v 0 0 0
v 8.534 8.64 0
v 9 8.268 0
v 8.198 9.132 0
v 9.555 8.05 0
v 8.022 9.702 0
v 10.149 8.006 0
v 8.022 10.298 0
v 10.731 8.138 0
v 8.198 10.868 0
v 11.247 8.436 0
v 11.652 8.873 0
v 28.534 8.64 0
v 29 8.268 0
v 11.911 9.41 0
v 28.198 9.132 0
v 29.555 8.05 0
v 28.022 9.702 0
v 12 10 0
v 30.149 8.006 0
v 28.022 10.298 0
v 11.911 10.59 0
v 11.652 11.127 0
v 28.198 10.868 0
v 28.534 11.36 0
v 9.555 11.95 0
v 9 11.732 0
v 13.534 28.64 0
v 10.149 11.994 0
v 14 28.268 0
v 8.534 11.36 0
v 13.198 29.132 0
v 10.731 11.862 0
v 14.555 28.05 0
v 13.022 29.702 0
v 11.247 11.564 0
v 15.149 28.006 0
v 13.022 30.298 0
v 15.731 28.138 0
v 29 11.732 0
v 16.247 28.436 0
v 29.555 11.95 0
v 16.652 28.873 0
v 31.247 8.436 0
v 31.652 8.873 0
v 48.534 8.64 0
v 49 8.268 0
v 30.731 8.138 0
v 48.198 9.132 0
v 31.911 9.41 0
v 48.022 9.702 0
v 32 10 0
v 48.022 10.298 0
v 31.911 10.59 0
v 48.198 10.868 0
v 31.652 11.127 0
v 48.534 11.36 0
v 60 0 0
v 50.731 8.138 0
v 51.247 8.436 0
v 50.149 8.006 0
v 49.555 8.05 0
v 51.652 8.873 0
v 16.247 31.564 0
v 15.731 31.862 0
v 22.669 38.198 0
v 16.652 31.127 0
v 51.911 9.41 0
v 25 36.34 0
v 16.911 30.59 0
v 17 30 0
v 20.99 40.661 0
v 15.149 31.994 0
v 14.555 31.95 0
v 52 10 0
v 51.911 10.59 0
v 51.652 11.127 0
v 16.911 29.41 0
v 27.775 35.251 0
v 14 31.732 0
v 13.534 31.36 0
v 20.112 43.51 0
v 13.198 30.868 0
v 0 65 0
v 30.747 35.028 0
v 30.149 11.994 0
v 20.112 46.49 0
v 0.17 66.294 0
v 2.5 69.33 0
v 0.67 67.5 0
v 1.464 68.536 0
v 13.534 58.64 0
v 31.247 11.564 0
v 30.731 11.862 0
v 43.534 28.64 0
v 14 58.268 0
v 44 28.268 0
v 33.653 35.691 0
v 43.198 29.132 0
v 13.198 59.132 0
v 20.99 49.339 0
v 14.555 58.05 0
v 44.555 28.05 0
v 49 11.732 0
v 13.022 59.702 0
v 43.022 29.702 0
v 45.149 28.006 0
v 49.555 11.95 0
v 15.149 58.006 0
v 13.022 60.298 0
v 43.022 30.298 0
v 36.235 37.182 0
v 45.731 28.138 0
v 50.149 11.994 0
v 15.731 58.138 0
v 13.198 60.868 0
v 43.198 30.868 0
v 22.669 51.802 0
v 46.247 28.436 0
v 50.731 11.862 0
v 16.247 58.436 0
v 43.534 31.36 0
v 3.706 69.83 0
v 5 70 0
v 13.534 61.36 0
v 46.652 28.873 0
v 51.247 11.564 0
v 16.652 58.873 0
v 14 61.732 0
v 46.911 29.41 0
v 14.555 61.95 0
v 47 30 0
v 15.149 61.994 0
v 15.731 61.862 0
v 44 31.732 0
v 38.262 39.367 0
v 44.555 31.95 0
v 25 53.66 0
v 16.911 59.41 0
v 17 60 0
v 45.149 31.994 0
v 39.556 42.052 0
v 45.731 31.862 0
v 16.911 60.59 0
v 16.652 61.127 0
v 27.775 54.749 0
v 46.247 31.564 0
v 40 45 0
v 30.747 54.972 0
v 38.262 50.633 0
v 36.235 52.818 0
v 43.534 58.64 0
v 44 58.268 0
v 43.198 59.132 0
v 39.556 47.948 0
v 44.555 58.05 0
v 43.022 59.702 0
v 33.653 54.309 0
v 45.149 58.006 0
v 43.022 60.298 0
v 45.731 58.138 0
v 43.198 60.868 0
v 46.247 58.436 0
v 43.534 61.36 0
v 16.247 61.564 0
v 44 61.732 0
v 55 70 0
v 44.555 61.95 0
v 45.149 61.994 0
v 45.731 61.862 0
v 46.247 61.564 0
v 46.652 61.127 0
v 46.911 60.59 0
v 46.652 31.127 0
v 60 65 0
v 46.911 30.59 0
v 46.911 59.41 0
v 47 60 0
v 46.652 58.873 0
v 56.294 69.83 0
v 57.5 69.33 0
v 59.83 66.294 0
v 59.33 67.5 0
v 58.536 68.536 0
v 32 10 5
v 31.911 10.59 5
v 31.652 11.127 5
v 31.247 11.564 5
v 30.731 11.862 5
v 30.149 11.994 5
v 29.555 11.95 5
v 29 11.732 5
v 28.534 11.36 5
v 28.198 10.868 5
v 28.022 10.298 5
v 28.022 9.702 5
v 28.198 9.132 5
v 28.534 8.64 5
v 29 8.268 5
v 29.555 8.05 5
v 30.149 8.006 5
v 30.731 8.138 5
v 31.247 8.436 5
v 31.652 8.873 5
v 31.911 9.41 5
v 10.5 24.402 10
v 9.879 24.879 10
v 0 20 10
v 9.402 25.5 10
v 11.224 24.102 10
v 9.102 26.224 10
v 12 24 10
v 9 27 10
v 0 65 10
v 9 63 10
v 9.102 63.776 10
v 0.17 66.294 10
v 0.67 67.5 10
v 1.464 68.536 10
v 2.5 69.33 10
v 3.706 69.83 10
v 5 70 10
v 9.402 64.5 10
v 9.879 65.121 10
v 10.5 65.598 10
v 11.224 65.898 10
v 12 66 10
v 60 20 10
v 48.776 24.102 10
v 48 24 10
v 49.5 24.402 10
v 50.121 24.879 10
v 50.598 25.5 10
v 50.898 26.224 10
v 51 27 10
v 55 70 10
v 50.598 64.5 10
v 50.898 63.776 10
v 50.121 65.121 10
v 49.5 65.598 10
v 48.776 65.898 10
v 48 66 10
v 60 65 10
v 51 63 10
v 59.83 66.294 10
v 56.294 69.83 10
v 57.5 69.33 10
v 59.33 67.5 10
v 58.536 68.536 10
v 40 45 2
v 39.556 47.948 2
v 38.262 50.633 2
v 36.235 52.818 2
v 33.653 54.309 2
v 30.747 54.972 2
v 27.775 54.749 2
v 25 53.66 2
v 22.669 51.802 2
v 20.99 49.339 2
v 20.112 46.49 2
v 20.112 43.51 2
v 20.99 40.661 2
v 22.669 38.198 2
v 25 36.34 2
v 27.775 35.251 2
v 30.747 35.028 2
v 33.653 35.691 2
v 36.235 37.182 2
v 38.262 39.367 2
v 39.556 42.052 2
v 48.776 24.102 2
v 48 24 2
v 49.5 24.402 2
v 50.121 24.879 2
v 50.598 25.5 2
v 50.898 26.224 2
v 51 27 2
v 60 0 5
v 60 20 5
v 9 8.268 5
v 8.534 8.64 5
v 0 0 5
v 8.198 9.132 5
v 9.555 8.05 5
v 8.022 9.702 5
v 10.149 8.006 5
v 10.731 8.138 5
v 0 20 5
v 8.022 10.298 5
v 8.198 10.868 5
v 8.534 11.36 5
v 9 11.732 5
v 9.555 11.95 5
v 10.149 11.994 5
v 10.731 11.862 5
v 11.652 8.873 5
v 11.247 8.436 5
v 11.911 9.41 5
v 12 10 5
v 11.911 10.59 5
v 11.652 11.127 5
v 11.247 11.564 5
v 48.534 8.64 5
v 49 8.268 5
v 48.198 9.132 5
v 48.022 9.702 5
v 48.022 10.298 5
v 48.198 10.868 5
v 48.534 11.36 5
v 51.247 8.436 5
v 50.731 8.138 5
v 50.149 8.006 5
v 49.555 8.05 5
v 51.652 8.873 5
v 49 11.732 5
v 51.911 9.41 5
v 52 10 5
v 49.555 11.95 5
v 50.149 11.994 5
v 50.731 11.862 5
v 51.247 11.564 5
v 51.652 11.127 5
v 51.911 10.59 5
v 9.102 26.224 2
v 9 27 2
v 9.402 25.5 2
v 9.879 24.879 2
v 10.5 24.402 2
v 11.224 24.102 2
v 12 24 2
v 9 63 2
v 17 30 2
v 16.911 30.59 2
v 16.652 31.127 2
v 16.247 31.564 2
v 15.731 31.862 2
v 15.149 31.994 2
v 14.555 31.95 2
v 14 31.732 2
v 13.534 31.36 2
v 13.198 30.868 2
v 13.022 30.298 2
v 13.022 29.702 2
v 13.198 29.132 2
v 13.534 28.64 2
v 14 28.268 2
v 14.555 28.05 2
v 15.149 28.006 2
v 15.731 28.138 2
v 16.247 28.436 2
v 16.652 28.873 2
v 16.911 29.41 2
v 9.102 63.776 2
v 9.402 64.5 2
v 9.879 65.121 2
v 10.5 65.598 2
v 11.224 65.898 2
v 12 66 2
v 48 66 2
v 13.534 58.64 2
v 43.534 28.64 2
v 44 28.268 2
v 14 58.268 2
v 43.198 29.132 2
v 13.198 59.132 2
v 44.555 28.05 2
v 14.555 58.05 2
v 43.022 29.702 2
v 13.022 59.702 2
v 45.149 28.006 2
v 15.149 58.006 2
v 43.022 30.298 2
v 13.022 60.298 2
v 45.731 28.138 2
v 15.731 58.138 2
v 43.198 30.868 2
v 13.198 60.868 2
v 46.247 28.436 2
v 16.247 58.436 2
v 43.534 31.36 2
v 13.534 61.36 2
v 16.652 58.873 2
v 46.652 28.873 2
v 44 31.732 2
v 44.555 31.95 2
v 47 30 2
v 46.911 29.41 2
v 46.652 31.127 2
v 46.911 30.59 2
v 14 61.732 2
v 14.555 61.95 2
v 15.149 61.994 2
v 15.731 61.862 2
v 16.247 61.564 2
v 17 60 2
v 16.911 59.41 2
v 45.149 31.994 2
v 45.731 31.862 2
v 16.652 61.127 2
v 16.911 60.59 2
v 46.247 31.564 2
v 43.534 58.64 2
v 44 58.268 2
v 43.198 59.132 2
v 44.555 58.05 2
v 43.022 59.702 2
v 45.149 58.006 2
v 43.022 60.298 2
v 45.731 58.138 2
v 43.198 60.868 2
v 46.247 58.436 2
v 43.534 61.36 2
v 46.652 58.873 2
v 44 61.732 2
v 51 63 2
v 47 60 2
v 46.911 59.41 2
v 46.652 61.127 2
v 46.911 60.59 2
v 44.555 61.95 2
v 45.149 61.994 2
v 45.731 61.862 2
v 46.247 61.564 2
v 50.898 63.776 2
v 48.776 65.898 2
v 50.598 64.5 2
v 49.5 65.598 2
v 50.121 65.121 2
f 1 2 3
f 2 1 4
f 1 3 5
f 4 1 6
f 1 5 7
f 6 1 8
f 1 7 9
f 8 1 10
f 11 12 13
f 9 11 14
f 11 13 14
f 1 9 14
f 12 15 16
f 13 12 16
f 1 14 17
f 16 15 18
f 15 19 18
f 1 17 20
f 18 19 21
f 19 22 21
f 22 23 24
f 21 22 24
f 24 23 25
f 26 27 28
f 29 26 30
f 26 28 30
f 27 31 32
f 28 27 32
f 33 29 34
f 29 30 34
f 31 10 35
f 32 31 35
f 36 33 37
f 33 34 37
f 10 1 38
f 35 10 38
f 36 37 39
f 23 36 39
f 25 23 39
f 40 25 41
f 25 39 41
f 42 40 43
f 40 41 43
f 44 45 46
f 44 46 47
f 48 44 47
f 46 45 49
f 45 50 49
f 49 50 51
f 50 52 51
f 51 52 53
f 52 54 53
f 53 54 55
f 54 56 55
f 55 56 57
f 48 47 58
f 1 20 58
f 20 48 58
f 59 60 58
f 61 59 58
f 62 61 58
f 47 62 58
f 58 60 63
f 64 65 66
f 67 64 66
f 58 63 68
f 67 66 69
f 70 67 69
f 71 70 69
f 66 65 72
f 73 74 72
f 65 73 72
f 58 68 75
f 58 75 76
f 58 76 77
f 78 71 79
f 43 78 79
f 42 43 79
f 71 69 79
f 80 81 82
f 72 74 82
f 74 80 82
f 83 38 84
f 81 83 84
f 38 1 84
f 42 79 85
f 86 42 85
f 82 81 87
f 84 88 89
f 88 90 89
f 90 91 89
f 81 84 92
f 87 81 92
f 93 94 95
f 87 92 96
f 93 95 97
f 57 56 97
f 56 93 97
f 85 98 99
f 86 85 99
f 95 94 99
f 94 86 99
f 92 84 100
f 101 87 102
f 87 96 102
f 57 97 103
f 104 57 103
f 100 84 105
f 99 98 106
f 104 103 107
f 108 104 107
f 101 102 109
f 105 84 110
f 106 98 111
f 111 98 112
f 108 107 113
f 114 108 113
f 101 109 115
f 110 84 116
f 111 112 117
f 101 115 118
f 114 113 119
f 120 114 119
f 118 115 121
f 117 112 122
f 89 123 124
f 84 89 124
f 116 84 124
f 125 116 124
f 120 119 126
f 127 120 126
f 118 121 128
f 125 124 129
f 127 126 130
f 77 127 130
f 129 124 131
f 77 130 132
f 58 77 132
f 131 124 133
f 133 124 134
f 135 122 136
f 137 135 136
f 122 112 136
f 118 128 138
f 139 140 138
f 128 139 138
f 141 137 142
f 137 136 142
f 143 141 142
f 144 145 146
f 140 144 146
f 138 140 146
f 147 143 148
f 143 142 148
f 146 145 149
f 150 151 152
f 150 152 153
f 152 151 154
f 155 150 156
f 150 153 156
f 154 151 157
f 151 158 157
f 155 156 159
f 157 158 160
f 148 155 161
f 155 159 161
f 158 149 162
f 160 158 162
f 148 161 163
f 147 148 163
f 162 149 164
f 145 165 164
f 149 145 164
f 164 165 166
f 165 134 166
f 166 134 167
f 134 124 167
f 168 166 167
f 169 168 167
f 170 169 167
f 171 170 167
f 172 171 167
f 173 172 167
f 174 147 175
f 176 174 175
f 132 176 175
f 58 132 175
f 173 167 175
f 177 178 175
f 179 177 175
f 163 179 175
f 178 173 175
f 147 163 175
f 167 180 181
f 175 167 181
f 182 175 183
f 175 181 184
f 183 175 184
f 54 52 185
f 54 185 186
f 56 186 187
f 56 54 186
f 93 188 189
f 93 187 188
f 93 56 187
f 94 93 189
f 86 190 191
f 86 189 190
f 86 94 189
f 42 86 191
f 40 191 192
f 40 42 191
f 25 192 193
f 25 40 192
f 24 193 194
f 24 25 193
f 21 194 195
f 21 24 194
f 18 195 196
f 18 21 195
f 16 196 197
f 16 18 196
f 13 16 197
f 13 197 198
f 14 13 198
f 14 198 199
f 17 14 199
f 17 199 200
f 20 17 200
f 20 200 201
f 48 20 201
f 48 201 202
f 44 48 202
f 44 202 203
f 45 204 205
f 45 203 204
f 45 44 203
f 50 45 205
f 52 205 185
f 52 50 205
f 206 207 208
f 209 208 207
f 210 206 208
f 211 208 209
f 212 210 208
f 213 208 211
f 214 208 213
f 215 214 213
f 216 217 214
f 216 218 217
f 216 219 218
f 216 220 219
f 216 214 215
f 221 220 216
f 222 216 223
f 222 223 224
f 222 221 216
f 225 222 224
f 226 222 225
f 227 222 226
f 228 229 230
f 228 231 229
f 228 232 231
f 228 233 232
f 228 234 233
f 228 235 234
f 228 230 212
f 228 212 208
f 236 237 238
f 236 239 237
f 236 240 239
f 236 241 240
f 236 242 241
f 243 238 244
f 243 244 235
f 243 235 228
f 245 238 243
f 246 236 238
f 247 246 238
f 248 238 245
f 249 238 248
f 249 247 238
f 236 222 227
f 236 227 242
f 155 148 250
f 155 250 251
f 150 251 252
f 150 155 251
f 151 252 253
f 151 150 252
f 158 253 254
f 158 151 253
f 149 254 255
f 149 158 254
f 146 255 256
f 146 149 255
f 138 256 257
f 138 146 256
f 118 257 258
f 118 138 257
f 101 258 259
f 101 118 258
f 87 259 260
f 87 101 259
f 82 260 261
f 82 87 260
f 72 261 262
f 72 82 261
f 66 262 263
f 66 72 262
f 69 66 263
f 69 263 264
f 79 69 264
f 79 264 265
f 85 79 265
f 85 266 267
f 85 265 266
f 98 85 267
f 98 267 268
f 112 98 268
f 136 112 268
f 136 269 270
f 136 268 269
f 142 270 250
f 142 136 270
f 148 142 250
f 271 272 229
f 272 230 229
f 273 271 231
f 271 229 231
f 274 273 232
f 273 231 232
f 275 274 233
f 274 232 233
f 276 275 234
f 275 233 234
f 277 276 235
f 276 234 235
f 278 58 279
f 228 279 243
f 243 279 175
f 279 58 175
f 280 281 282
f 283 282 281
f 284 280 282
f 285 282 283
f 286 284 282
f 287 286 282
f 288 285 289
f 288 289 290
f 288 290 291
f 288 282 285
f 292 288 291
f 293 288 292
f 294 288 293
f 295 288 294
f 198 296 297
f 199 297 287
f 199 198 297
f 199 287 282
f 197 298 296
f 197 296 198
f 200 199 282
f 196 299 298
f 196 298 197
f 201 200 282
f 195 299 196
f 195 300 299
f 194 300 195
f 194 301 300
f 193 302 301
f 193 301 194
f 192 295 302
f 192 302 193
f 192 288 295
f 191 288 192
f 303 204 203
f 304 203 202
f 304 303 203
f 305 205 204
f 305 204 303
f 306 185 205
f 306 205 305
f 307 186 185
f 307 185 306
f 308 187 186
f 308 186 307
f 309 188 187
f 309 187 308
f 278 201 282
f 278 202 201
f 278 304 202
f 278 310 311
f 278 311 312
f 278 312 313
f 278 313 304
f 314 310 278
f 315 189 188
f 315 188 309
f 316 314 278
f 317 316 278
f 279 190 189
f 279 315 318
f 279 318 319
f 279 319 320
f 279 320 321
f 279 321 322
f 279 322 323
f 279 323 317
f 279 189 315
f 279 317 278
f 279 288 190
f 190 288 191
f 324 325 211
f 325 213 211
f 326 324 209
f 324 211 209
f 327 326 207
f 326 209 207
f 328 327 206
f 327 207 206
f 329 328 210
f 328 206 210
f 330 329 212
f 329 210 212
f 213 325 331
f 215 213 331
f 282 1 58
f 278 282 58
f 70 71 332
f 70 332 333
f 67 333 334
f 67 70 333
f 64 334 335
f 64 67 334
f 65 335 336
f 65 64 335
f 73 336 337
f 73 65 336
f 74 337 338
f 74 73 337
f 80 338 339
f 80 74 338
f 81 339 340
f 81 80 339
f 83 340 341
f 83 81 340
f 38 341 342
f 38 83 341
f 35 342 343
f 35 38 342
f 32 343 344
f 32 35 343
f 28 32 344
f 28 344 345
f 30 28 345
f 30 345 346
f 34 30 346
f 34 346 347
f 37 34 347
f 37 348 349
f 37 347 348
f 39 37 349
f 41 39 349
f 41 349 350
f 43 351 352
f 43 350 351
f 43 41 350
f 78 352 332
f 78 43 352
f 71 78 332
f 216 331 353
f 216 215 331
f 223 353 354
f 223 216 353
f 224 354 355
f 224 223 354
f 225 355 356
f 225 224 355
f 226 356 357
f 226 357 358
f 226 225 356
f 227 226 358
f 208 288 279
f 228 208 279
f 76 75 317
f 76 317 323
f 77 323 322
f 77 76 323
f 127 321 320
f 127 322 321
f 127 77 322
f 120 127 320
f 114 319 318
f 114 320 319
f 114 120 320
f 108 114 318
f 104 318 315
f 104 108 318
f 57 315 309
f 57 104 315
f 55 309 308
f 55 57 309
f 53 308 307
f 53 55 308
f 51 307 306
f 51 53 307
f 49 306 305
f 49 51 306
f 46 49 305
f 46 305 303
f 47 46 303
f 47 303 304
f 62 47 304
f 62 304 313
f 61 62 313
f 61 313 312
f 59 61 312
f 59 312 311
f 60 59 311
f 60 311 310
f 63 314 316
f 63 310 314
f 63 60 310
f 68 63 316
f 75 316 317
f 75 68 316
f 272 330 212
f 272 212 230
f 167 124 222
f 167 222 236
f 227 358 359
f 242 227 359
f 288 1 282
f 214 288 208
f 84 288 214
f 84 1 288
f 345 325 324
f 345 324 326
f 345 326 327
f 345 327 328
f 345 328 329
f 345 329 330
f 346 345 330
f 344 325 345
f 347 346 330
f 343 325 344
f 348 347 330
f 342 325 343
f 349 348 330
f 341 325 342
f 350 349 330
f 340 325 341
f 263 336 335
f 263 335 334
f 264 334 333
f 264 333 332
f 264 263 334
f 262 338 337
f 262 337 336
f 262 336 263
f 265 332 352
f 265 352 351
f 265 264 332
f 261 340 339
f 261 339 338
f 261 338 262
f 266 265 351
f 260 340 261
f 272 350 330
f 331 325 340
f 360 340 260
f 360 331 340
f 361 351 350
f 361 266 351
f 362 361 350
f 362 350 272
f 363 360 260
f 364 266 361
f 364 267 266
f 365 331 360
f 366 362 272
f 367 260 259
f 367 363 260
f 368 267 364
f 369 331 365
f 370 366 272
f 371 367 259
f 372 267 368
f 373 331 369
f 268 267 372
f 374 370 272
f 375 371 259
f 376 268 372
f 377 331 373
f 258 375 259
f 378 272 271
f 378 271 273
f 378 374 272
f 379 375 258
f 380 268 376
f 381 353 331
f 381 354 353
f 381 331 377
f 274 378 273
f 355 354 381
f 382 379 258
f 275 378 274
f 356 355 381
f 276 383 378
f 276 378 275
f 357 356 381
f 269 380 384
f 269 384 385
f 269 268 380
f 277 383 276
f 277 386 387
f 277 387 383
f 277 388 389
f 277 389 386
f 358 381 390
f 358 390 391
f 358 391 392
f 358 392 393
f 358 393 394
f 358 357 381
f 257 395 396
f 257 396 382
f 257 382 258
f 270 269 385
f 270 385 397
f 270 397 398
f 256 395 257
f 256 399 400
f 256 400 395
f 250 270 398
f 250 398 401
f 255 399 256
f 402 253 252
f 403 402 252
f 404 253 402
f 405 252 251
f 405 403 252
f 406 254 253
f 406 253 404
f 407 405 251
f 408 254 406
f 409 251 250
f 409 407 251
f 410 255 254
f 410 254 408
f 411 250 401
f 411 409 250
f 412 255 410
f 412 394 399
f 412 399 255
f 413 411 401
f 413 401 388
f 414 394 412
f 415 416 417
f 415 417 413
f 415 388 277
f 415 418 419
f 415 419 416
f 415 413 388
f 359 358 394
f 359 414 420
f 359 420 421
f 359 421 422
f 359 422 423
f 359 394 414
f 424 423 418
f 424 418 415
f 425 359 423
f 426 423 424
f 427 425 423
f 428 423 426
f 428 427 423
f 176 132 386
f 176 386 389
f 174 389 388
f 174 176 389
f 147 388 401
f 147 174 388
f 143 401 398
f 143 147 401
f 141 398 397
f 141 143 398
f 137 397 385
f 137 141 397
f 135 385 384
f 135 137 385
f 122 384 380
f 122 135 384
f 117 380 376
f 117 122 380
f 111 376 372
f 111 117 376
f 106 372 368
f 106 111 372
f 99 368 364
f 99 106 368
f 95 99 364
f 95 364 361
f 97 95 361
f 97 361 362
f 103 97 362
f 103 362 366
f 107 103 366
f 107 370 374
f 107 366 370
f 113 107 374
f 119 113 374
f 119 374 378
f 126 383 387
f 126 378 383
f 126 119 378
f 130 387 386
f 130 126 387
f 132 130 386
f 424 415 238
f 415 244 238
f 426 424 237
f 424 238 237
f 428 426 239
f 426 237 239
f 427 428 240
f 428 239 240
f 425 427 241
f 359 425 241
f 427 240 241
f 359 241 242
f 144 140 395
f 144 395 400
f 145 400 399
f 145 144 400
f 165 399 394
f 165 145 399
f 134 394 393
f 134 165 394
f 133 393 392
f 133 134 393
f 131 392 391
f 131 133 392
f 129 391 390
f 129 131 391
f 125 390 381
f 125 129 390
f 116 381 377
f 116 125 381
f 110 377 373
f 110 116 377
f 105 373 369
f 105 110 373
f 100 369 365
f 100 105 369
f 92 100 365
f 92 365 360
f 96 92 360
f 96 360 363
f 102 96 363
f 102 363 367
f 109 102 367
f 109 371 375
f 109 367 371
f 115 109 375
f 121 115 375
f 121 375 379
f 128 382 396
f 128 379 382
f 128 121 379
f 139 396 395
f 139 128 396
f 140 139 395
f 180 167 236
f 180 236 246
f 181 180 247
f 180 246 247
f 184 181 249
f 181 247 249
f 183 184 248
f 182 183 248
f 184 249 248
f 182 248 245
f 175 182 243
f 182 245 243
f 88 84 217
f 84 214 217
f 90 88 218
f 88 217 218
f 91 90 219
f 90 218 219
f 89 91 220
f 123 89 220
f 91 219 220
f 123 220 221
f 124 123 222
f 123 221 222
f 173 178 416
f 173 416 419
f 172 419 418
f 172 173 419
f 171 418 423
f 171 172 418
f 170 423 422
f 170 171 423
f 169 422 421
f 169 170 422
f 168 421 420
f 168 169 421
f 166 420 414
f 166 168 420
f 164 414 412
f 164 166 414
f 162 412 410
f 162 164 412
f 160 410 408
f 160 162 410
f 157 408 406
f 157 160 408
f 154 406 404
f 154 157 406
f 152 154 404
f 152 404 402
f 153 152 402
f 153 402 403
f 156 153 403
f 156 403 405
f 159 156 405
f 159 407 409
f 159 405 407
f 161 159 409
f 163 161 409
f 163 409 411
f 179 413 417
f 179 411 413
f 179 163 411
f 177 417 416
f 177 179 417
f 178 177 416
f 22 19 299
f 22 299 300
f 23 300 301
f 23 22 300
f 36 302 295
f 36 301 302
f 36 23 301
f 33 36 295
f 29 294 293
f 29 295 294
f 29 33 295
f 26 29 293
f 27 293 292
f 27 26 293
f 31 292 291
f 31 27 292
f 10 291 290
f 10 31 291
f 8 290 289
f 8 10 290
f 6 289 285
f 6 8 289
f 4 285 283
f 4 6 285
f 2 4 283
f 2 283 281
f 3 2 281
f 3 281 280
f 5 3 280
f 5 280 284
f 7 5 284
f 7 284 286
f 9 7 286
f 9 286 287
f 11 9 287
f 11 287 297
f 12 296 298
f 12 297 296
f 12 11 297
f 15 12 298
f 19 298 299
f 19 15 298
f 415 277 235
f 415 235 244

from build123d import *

# Parameters (mm, degrees)
CYLINDER007_R     = 10
CYLINDER007_DEPTH = 10
CYLINDER006_R     = 2
CYLINDER006_DEPTH = 10
CYLINDER005_R     = 2
CYLINDER005_DEPTH = 10
CYLINDER004_R     = 2
CYLINDER004_DEPTH = 10
CYLINDER003_R     = 2
CYLINDER003_DEPTH = 10
BOX002_W          = 42
BOX002_H          = 42
BOX002_DEPTH      = 10
CYLINDER002_R     = 2
CYLINDER002_DEPTH = 10
CYLINDER001_R     = 2
CYLINDER001_DEPTH = 10
CYLINDER_R        = 2
CYLINDER_DEPTH    = 10
BOX001_W          = 60
BOX001_H          = 20
BOX001_DEPTH      = 10
BOX_W             = 60
BOX_H             = 70
BOX_DEPTH         = 10
FILLET_R          = 5
FILLET001_R       = 5
FILLET002_R       = 3


with BuildPart() as cylinder007:
    # Cylinder007 → Cylinder007 (new body)
    with BuildSketch(Plane(origin=(30, 45, -1), x_dir=(1, 0, 0), z_dir=(0, 0, 1))):
        Circle(CYLINDER007_R)
    extrude(amount=CYLINDER007_DEPTH)


with BuildPart() as cylinder006:
    # Cylinder006 → Cylinder006 (new body)
    with BuildSketch(Plane(origin=(45, 30, -1), x_dir=(1, 0, 0), z_dir=(0, 0, 1))):
        Circle(CYLINDER006_R)
    extrude(amount=CYLINDER006_DEPTH)


with BuildPart() as cylinder005:
    # Cylinder005 → Cylinder005 (new body)
    with BuildSketch(Plane(origin=(45, 60, -1), x_dir=(1, 0, 0), z_dir=(0, 0, 1))):
        Circle(CYLINDER005_R)
    extrude(amount=CYLINDER005_DEPTH)


with BuildPart() as cylinder004:
    # Cylinder004 → Cylinder004 (new body)
    with BuildSketch(Plane(origin=(15, 60, -1), x_dir=(1, 0, 0), z_dir=(0, 0, 1))):
        Circle(CYLINDER004_R)
    extrude(amount=CYLINDER004_DEPTH)


with BuildPart() as cylinder003:
    # Cylinder003 → Cylinder003 (new body)
    with BuildSketch(Plane(origin=(15, 30, -1), x_dir=(1, 0, 0), z_dir=(0, 0, 1))):
        Circle(CYLINDER003_R)
    extrude(amount=CYLINDER003_DEPTH)


with BuildPart() as cube002:
    # Box002 → Box002 (new body)
    with BuildSketch(Plane(origin=(9, 24, 2), x_dir=(1, 0, 0), z_dir=(0, 0, 1))):
        with Locations((21, 21)):
            Rectangle(BOX002_W, BOX002_H)
    extrude(amount=BOX002_DEPTH)


with BuildPart() as cylinder002:
    # Cylinder002 → Cylinder002 (new body)
    with BuildSketch(Plane(origin=(50, 10, -1), x_dir=(1, 0, 0), z_dir=(0, 0, 1))):
        Circle(CYLINDER002_R)
    extrude(amount=CYLINDER002_DEPTH)


with BuildPart() as cylinder001:
    # Cylinder001 → Cylinder001 (new body)
    with BuildSketch(Plane(origin=(30, 10, -1), x_dir=(1, 0, 0), z_dir=(0, 0, 1))):
        Circle(CYLINDER001_R)
    extrude(amount=CYLINDER001_DEPTH)


with BuildPart() as cylinder:
    # Cylinder → Cylinder (new body)
    with BuildSketch(Plane(origin=(10, 10, -1), x_dir=(1, 0, 0), z_dir=(0, 0, 1))):
        Circle(CYLINDER_R)
    extrude(amount=CYLINDER_DEPTH)


with BuildPart() as cube001:
    # Box001 → Box001 (new body)
    with BuildSketch(Plane.XY.offset(5)):
        with Locations((30, 10)):
            Rectangle(BOX001_W, BOX001_H)
    extrude(amount=BOX001_DEPTH)


with BuildPart() as sujeccionmotor:
    # Box → Box (new body)
    with BuildSketch(Plane.XY):
        with Locations((30, 35)):
            Rectangle(BOX_W, BOX_H)
    extrude(amount=BOX_DEPTH)

    # Cut: cut Cube001
    add(cube001.part, mode=Mode.SUBTRACT)

    # Cut001: cut Cylinder
    add(cylinder.part, mode=Mode.SUBTRACT)

    # Cut002: cut Cylinder001
    add(cylinder001.part, mode=Mode.SUBTRACT)

    # Cut003: cut Cylinder002
    add(cylinder002.part, mode=Mode.SUBTRACT)

    # Cut004: cut Cube002
    add(cube002.part, mode=Mode.SUBTRACT)

    # Cut005: cut Cylinder003
    add(cylinder003.part, mode=Mode.SUBTRACT)

    # Cut006: cut Cylinder004
    add(cylinder004.part, mode=Mode.SUBTRACT)

    # Cut007: cut Cylinder005
    add(cylinder005.part, mode=Mode.SUBTRACT)

    # Cut008: cut Cylinder006
    add(cylinder006.part, mode=Mode.SUBTRACT)

    # Fillet
    fillet_edges = [sujeccionmotor.edges().sort_by_distance(p)[0] for p in [
        (0, 70, 5),
    ]]
    fillet(fillet_edges, radius=FILLET_R)

    # Fillet001
    fillet001_edges = [sujeccionmotor.edges().sort_by_distance(p)[0] for p in [
        (60, 70, 5),
    ]]
    fillet(fillet001_edges, radius=FILLET001_R)

    # Fillet002
    fillet002_edges = [sujeccionmotor.edges().sort_by_distance(p)[0] for p in [
        (51, 24, 6),
        (9, 24, 6),
        (51, 66, 6),
        (9, 66, 6),
    ]]
    fillet(fillet002_edges, radius=FILLET002_R)

    # Cut009: cut Cylinder007
    add(cylinder007.part, mode=Mode.SUBTRACT)


solid = sujeccionmotor.part
